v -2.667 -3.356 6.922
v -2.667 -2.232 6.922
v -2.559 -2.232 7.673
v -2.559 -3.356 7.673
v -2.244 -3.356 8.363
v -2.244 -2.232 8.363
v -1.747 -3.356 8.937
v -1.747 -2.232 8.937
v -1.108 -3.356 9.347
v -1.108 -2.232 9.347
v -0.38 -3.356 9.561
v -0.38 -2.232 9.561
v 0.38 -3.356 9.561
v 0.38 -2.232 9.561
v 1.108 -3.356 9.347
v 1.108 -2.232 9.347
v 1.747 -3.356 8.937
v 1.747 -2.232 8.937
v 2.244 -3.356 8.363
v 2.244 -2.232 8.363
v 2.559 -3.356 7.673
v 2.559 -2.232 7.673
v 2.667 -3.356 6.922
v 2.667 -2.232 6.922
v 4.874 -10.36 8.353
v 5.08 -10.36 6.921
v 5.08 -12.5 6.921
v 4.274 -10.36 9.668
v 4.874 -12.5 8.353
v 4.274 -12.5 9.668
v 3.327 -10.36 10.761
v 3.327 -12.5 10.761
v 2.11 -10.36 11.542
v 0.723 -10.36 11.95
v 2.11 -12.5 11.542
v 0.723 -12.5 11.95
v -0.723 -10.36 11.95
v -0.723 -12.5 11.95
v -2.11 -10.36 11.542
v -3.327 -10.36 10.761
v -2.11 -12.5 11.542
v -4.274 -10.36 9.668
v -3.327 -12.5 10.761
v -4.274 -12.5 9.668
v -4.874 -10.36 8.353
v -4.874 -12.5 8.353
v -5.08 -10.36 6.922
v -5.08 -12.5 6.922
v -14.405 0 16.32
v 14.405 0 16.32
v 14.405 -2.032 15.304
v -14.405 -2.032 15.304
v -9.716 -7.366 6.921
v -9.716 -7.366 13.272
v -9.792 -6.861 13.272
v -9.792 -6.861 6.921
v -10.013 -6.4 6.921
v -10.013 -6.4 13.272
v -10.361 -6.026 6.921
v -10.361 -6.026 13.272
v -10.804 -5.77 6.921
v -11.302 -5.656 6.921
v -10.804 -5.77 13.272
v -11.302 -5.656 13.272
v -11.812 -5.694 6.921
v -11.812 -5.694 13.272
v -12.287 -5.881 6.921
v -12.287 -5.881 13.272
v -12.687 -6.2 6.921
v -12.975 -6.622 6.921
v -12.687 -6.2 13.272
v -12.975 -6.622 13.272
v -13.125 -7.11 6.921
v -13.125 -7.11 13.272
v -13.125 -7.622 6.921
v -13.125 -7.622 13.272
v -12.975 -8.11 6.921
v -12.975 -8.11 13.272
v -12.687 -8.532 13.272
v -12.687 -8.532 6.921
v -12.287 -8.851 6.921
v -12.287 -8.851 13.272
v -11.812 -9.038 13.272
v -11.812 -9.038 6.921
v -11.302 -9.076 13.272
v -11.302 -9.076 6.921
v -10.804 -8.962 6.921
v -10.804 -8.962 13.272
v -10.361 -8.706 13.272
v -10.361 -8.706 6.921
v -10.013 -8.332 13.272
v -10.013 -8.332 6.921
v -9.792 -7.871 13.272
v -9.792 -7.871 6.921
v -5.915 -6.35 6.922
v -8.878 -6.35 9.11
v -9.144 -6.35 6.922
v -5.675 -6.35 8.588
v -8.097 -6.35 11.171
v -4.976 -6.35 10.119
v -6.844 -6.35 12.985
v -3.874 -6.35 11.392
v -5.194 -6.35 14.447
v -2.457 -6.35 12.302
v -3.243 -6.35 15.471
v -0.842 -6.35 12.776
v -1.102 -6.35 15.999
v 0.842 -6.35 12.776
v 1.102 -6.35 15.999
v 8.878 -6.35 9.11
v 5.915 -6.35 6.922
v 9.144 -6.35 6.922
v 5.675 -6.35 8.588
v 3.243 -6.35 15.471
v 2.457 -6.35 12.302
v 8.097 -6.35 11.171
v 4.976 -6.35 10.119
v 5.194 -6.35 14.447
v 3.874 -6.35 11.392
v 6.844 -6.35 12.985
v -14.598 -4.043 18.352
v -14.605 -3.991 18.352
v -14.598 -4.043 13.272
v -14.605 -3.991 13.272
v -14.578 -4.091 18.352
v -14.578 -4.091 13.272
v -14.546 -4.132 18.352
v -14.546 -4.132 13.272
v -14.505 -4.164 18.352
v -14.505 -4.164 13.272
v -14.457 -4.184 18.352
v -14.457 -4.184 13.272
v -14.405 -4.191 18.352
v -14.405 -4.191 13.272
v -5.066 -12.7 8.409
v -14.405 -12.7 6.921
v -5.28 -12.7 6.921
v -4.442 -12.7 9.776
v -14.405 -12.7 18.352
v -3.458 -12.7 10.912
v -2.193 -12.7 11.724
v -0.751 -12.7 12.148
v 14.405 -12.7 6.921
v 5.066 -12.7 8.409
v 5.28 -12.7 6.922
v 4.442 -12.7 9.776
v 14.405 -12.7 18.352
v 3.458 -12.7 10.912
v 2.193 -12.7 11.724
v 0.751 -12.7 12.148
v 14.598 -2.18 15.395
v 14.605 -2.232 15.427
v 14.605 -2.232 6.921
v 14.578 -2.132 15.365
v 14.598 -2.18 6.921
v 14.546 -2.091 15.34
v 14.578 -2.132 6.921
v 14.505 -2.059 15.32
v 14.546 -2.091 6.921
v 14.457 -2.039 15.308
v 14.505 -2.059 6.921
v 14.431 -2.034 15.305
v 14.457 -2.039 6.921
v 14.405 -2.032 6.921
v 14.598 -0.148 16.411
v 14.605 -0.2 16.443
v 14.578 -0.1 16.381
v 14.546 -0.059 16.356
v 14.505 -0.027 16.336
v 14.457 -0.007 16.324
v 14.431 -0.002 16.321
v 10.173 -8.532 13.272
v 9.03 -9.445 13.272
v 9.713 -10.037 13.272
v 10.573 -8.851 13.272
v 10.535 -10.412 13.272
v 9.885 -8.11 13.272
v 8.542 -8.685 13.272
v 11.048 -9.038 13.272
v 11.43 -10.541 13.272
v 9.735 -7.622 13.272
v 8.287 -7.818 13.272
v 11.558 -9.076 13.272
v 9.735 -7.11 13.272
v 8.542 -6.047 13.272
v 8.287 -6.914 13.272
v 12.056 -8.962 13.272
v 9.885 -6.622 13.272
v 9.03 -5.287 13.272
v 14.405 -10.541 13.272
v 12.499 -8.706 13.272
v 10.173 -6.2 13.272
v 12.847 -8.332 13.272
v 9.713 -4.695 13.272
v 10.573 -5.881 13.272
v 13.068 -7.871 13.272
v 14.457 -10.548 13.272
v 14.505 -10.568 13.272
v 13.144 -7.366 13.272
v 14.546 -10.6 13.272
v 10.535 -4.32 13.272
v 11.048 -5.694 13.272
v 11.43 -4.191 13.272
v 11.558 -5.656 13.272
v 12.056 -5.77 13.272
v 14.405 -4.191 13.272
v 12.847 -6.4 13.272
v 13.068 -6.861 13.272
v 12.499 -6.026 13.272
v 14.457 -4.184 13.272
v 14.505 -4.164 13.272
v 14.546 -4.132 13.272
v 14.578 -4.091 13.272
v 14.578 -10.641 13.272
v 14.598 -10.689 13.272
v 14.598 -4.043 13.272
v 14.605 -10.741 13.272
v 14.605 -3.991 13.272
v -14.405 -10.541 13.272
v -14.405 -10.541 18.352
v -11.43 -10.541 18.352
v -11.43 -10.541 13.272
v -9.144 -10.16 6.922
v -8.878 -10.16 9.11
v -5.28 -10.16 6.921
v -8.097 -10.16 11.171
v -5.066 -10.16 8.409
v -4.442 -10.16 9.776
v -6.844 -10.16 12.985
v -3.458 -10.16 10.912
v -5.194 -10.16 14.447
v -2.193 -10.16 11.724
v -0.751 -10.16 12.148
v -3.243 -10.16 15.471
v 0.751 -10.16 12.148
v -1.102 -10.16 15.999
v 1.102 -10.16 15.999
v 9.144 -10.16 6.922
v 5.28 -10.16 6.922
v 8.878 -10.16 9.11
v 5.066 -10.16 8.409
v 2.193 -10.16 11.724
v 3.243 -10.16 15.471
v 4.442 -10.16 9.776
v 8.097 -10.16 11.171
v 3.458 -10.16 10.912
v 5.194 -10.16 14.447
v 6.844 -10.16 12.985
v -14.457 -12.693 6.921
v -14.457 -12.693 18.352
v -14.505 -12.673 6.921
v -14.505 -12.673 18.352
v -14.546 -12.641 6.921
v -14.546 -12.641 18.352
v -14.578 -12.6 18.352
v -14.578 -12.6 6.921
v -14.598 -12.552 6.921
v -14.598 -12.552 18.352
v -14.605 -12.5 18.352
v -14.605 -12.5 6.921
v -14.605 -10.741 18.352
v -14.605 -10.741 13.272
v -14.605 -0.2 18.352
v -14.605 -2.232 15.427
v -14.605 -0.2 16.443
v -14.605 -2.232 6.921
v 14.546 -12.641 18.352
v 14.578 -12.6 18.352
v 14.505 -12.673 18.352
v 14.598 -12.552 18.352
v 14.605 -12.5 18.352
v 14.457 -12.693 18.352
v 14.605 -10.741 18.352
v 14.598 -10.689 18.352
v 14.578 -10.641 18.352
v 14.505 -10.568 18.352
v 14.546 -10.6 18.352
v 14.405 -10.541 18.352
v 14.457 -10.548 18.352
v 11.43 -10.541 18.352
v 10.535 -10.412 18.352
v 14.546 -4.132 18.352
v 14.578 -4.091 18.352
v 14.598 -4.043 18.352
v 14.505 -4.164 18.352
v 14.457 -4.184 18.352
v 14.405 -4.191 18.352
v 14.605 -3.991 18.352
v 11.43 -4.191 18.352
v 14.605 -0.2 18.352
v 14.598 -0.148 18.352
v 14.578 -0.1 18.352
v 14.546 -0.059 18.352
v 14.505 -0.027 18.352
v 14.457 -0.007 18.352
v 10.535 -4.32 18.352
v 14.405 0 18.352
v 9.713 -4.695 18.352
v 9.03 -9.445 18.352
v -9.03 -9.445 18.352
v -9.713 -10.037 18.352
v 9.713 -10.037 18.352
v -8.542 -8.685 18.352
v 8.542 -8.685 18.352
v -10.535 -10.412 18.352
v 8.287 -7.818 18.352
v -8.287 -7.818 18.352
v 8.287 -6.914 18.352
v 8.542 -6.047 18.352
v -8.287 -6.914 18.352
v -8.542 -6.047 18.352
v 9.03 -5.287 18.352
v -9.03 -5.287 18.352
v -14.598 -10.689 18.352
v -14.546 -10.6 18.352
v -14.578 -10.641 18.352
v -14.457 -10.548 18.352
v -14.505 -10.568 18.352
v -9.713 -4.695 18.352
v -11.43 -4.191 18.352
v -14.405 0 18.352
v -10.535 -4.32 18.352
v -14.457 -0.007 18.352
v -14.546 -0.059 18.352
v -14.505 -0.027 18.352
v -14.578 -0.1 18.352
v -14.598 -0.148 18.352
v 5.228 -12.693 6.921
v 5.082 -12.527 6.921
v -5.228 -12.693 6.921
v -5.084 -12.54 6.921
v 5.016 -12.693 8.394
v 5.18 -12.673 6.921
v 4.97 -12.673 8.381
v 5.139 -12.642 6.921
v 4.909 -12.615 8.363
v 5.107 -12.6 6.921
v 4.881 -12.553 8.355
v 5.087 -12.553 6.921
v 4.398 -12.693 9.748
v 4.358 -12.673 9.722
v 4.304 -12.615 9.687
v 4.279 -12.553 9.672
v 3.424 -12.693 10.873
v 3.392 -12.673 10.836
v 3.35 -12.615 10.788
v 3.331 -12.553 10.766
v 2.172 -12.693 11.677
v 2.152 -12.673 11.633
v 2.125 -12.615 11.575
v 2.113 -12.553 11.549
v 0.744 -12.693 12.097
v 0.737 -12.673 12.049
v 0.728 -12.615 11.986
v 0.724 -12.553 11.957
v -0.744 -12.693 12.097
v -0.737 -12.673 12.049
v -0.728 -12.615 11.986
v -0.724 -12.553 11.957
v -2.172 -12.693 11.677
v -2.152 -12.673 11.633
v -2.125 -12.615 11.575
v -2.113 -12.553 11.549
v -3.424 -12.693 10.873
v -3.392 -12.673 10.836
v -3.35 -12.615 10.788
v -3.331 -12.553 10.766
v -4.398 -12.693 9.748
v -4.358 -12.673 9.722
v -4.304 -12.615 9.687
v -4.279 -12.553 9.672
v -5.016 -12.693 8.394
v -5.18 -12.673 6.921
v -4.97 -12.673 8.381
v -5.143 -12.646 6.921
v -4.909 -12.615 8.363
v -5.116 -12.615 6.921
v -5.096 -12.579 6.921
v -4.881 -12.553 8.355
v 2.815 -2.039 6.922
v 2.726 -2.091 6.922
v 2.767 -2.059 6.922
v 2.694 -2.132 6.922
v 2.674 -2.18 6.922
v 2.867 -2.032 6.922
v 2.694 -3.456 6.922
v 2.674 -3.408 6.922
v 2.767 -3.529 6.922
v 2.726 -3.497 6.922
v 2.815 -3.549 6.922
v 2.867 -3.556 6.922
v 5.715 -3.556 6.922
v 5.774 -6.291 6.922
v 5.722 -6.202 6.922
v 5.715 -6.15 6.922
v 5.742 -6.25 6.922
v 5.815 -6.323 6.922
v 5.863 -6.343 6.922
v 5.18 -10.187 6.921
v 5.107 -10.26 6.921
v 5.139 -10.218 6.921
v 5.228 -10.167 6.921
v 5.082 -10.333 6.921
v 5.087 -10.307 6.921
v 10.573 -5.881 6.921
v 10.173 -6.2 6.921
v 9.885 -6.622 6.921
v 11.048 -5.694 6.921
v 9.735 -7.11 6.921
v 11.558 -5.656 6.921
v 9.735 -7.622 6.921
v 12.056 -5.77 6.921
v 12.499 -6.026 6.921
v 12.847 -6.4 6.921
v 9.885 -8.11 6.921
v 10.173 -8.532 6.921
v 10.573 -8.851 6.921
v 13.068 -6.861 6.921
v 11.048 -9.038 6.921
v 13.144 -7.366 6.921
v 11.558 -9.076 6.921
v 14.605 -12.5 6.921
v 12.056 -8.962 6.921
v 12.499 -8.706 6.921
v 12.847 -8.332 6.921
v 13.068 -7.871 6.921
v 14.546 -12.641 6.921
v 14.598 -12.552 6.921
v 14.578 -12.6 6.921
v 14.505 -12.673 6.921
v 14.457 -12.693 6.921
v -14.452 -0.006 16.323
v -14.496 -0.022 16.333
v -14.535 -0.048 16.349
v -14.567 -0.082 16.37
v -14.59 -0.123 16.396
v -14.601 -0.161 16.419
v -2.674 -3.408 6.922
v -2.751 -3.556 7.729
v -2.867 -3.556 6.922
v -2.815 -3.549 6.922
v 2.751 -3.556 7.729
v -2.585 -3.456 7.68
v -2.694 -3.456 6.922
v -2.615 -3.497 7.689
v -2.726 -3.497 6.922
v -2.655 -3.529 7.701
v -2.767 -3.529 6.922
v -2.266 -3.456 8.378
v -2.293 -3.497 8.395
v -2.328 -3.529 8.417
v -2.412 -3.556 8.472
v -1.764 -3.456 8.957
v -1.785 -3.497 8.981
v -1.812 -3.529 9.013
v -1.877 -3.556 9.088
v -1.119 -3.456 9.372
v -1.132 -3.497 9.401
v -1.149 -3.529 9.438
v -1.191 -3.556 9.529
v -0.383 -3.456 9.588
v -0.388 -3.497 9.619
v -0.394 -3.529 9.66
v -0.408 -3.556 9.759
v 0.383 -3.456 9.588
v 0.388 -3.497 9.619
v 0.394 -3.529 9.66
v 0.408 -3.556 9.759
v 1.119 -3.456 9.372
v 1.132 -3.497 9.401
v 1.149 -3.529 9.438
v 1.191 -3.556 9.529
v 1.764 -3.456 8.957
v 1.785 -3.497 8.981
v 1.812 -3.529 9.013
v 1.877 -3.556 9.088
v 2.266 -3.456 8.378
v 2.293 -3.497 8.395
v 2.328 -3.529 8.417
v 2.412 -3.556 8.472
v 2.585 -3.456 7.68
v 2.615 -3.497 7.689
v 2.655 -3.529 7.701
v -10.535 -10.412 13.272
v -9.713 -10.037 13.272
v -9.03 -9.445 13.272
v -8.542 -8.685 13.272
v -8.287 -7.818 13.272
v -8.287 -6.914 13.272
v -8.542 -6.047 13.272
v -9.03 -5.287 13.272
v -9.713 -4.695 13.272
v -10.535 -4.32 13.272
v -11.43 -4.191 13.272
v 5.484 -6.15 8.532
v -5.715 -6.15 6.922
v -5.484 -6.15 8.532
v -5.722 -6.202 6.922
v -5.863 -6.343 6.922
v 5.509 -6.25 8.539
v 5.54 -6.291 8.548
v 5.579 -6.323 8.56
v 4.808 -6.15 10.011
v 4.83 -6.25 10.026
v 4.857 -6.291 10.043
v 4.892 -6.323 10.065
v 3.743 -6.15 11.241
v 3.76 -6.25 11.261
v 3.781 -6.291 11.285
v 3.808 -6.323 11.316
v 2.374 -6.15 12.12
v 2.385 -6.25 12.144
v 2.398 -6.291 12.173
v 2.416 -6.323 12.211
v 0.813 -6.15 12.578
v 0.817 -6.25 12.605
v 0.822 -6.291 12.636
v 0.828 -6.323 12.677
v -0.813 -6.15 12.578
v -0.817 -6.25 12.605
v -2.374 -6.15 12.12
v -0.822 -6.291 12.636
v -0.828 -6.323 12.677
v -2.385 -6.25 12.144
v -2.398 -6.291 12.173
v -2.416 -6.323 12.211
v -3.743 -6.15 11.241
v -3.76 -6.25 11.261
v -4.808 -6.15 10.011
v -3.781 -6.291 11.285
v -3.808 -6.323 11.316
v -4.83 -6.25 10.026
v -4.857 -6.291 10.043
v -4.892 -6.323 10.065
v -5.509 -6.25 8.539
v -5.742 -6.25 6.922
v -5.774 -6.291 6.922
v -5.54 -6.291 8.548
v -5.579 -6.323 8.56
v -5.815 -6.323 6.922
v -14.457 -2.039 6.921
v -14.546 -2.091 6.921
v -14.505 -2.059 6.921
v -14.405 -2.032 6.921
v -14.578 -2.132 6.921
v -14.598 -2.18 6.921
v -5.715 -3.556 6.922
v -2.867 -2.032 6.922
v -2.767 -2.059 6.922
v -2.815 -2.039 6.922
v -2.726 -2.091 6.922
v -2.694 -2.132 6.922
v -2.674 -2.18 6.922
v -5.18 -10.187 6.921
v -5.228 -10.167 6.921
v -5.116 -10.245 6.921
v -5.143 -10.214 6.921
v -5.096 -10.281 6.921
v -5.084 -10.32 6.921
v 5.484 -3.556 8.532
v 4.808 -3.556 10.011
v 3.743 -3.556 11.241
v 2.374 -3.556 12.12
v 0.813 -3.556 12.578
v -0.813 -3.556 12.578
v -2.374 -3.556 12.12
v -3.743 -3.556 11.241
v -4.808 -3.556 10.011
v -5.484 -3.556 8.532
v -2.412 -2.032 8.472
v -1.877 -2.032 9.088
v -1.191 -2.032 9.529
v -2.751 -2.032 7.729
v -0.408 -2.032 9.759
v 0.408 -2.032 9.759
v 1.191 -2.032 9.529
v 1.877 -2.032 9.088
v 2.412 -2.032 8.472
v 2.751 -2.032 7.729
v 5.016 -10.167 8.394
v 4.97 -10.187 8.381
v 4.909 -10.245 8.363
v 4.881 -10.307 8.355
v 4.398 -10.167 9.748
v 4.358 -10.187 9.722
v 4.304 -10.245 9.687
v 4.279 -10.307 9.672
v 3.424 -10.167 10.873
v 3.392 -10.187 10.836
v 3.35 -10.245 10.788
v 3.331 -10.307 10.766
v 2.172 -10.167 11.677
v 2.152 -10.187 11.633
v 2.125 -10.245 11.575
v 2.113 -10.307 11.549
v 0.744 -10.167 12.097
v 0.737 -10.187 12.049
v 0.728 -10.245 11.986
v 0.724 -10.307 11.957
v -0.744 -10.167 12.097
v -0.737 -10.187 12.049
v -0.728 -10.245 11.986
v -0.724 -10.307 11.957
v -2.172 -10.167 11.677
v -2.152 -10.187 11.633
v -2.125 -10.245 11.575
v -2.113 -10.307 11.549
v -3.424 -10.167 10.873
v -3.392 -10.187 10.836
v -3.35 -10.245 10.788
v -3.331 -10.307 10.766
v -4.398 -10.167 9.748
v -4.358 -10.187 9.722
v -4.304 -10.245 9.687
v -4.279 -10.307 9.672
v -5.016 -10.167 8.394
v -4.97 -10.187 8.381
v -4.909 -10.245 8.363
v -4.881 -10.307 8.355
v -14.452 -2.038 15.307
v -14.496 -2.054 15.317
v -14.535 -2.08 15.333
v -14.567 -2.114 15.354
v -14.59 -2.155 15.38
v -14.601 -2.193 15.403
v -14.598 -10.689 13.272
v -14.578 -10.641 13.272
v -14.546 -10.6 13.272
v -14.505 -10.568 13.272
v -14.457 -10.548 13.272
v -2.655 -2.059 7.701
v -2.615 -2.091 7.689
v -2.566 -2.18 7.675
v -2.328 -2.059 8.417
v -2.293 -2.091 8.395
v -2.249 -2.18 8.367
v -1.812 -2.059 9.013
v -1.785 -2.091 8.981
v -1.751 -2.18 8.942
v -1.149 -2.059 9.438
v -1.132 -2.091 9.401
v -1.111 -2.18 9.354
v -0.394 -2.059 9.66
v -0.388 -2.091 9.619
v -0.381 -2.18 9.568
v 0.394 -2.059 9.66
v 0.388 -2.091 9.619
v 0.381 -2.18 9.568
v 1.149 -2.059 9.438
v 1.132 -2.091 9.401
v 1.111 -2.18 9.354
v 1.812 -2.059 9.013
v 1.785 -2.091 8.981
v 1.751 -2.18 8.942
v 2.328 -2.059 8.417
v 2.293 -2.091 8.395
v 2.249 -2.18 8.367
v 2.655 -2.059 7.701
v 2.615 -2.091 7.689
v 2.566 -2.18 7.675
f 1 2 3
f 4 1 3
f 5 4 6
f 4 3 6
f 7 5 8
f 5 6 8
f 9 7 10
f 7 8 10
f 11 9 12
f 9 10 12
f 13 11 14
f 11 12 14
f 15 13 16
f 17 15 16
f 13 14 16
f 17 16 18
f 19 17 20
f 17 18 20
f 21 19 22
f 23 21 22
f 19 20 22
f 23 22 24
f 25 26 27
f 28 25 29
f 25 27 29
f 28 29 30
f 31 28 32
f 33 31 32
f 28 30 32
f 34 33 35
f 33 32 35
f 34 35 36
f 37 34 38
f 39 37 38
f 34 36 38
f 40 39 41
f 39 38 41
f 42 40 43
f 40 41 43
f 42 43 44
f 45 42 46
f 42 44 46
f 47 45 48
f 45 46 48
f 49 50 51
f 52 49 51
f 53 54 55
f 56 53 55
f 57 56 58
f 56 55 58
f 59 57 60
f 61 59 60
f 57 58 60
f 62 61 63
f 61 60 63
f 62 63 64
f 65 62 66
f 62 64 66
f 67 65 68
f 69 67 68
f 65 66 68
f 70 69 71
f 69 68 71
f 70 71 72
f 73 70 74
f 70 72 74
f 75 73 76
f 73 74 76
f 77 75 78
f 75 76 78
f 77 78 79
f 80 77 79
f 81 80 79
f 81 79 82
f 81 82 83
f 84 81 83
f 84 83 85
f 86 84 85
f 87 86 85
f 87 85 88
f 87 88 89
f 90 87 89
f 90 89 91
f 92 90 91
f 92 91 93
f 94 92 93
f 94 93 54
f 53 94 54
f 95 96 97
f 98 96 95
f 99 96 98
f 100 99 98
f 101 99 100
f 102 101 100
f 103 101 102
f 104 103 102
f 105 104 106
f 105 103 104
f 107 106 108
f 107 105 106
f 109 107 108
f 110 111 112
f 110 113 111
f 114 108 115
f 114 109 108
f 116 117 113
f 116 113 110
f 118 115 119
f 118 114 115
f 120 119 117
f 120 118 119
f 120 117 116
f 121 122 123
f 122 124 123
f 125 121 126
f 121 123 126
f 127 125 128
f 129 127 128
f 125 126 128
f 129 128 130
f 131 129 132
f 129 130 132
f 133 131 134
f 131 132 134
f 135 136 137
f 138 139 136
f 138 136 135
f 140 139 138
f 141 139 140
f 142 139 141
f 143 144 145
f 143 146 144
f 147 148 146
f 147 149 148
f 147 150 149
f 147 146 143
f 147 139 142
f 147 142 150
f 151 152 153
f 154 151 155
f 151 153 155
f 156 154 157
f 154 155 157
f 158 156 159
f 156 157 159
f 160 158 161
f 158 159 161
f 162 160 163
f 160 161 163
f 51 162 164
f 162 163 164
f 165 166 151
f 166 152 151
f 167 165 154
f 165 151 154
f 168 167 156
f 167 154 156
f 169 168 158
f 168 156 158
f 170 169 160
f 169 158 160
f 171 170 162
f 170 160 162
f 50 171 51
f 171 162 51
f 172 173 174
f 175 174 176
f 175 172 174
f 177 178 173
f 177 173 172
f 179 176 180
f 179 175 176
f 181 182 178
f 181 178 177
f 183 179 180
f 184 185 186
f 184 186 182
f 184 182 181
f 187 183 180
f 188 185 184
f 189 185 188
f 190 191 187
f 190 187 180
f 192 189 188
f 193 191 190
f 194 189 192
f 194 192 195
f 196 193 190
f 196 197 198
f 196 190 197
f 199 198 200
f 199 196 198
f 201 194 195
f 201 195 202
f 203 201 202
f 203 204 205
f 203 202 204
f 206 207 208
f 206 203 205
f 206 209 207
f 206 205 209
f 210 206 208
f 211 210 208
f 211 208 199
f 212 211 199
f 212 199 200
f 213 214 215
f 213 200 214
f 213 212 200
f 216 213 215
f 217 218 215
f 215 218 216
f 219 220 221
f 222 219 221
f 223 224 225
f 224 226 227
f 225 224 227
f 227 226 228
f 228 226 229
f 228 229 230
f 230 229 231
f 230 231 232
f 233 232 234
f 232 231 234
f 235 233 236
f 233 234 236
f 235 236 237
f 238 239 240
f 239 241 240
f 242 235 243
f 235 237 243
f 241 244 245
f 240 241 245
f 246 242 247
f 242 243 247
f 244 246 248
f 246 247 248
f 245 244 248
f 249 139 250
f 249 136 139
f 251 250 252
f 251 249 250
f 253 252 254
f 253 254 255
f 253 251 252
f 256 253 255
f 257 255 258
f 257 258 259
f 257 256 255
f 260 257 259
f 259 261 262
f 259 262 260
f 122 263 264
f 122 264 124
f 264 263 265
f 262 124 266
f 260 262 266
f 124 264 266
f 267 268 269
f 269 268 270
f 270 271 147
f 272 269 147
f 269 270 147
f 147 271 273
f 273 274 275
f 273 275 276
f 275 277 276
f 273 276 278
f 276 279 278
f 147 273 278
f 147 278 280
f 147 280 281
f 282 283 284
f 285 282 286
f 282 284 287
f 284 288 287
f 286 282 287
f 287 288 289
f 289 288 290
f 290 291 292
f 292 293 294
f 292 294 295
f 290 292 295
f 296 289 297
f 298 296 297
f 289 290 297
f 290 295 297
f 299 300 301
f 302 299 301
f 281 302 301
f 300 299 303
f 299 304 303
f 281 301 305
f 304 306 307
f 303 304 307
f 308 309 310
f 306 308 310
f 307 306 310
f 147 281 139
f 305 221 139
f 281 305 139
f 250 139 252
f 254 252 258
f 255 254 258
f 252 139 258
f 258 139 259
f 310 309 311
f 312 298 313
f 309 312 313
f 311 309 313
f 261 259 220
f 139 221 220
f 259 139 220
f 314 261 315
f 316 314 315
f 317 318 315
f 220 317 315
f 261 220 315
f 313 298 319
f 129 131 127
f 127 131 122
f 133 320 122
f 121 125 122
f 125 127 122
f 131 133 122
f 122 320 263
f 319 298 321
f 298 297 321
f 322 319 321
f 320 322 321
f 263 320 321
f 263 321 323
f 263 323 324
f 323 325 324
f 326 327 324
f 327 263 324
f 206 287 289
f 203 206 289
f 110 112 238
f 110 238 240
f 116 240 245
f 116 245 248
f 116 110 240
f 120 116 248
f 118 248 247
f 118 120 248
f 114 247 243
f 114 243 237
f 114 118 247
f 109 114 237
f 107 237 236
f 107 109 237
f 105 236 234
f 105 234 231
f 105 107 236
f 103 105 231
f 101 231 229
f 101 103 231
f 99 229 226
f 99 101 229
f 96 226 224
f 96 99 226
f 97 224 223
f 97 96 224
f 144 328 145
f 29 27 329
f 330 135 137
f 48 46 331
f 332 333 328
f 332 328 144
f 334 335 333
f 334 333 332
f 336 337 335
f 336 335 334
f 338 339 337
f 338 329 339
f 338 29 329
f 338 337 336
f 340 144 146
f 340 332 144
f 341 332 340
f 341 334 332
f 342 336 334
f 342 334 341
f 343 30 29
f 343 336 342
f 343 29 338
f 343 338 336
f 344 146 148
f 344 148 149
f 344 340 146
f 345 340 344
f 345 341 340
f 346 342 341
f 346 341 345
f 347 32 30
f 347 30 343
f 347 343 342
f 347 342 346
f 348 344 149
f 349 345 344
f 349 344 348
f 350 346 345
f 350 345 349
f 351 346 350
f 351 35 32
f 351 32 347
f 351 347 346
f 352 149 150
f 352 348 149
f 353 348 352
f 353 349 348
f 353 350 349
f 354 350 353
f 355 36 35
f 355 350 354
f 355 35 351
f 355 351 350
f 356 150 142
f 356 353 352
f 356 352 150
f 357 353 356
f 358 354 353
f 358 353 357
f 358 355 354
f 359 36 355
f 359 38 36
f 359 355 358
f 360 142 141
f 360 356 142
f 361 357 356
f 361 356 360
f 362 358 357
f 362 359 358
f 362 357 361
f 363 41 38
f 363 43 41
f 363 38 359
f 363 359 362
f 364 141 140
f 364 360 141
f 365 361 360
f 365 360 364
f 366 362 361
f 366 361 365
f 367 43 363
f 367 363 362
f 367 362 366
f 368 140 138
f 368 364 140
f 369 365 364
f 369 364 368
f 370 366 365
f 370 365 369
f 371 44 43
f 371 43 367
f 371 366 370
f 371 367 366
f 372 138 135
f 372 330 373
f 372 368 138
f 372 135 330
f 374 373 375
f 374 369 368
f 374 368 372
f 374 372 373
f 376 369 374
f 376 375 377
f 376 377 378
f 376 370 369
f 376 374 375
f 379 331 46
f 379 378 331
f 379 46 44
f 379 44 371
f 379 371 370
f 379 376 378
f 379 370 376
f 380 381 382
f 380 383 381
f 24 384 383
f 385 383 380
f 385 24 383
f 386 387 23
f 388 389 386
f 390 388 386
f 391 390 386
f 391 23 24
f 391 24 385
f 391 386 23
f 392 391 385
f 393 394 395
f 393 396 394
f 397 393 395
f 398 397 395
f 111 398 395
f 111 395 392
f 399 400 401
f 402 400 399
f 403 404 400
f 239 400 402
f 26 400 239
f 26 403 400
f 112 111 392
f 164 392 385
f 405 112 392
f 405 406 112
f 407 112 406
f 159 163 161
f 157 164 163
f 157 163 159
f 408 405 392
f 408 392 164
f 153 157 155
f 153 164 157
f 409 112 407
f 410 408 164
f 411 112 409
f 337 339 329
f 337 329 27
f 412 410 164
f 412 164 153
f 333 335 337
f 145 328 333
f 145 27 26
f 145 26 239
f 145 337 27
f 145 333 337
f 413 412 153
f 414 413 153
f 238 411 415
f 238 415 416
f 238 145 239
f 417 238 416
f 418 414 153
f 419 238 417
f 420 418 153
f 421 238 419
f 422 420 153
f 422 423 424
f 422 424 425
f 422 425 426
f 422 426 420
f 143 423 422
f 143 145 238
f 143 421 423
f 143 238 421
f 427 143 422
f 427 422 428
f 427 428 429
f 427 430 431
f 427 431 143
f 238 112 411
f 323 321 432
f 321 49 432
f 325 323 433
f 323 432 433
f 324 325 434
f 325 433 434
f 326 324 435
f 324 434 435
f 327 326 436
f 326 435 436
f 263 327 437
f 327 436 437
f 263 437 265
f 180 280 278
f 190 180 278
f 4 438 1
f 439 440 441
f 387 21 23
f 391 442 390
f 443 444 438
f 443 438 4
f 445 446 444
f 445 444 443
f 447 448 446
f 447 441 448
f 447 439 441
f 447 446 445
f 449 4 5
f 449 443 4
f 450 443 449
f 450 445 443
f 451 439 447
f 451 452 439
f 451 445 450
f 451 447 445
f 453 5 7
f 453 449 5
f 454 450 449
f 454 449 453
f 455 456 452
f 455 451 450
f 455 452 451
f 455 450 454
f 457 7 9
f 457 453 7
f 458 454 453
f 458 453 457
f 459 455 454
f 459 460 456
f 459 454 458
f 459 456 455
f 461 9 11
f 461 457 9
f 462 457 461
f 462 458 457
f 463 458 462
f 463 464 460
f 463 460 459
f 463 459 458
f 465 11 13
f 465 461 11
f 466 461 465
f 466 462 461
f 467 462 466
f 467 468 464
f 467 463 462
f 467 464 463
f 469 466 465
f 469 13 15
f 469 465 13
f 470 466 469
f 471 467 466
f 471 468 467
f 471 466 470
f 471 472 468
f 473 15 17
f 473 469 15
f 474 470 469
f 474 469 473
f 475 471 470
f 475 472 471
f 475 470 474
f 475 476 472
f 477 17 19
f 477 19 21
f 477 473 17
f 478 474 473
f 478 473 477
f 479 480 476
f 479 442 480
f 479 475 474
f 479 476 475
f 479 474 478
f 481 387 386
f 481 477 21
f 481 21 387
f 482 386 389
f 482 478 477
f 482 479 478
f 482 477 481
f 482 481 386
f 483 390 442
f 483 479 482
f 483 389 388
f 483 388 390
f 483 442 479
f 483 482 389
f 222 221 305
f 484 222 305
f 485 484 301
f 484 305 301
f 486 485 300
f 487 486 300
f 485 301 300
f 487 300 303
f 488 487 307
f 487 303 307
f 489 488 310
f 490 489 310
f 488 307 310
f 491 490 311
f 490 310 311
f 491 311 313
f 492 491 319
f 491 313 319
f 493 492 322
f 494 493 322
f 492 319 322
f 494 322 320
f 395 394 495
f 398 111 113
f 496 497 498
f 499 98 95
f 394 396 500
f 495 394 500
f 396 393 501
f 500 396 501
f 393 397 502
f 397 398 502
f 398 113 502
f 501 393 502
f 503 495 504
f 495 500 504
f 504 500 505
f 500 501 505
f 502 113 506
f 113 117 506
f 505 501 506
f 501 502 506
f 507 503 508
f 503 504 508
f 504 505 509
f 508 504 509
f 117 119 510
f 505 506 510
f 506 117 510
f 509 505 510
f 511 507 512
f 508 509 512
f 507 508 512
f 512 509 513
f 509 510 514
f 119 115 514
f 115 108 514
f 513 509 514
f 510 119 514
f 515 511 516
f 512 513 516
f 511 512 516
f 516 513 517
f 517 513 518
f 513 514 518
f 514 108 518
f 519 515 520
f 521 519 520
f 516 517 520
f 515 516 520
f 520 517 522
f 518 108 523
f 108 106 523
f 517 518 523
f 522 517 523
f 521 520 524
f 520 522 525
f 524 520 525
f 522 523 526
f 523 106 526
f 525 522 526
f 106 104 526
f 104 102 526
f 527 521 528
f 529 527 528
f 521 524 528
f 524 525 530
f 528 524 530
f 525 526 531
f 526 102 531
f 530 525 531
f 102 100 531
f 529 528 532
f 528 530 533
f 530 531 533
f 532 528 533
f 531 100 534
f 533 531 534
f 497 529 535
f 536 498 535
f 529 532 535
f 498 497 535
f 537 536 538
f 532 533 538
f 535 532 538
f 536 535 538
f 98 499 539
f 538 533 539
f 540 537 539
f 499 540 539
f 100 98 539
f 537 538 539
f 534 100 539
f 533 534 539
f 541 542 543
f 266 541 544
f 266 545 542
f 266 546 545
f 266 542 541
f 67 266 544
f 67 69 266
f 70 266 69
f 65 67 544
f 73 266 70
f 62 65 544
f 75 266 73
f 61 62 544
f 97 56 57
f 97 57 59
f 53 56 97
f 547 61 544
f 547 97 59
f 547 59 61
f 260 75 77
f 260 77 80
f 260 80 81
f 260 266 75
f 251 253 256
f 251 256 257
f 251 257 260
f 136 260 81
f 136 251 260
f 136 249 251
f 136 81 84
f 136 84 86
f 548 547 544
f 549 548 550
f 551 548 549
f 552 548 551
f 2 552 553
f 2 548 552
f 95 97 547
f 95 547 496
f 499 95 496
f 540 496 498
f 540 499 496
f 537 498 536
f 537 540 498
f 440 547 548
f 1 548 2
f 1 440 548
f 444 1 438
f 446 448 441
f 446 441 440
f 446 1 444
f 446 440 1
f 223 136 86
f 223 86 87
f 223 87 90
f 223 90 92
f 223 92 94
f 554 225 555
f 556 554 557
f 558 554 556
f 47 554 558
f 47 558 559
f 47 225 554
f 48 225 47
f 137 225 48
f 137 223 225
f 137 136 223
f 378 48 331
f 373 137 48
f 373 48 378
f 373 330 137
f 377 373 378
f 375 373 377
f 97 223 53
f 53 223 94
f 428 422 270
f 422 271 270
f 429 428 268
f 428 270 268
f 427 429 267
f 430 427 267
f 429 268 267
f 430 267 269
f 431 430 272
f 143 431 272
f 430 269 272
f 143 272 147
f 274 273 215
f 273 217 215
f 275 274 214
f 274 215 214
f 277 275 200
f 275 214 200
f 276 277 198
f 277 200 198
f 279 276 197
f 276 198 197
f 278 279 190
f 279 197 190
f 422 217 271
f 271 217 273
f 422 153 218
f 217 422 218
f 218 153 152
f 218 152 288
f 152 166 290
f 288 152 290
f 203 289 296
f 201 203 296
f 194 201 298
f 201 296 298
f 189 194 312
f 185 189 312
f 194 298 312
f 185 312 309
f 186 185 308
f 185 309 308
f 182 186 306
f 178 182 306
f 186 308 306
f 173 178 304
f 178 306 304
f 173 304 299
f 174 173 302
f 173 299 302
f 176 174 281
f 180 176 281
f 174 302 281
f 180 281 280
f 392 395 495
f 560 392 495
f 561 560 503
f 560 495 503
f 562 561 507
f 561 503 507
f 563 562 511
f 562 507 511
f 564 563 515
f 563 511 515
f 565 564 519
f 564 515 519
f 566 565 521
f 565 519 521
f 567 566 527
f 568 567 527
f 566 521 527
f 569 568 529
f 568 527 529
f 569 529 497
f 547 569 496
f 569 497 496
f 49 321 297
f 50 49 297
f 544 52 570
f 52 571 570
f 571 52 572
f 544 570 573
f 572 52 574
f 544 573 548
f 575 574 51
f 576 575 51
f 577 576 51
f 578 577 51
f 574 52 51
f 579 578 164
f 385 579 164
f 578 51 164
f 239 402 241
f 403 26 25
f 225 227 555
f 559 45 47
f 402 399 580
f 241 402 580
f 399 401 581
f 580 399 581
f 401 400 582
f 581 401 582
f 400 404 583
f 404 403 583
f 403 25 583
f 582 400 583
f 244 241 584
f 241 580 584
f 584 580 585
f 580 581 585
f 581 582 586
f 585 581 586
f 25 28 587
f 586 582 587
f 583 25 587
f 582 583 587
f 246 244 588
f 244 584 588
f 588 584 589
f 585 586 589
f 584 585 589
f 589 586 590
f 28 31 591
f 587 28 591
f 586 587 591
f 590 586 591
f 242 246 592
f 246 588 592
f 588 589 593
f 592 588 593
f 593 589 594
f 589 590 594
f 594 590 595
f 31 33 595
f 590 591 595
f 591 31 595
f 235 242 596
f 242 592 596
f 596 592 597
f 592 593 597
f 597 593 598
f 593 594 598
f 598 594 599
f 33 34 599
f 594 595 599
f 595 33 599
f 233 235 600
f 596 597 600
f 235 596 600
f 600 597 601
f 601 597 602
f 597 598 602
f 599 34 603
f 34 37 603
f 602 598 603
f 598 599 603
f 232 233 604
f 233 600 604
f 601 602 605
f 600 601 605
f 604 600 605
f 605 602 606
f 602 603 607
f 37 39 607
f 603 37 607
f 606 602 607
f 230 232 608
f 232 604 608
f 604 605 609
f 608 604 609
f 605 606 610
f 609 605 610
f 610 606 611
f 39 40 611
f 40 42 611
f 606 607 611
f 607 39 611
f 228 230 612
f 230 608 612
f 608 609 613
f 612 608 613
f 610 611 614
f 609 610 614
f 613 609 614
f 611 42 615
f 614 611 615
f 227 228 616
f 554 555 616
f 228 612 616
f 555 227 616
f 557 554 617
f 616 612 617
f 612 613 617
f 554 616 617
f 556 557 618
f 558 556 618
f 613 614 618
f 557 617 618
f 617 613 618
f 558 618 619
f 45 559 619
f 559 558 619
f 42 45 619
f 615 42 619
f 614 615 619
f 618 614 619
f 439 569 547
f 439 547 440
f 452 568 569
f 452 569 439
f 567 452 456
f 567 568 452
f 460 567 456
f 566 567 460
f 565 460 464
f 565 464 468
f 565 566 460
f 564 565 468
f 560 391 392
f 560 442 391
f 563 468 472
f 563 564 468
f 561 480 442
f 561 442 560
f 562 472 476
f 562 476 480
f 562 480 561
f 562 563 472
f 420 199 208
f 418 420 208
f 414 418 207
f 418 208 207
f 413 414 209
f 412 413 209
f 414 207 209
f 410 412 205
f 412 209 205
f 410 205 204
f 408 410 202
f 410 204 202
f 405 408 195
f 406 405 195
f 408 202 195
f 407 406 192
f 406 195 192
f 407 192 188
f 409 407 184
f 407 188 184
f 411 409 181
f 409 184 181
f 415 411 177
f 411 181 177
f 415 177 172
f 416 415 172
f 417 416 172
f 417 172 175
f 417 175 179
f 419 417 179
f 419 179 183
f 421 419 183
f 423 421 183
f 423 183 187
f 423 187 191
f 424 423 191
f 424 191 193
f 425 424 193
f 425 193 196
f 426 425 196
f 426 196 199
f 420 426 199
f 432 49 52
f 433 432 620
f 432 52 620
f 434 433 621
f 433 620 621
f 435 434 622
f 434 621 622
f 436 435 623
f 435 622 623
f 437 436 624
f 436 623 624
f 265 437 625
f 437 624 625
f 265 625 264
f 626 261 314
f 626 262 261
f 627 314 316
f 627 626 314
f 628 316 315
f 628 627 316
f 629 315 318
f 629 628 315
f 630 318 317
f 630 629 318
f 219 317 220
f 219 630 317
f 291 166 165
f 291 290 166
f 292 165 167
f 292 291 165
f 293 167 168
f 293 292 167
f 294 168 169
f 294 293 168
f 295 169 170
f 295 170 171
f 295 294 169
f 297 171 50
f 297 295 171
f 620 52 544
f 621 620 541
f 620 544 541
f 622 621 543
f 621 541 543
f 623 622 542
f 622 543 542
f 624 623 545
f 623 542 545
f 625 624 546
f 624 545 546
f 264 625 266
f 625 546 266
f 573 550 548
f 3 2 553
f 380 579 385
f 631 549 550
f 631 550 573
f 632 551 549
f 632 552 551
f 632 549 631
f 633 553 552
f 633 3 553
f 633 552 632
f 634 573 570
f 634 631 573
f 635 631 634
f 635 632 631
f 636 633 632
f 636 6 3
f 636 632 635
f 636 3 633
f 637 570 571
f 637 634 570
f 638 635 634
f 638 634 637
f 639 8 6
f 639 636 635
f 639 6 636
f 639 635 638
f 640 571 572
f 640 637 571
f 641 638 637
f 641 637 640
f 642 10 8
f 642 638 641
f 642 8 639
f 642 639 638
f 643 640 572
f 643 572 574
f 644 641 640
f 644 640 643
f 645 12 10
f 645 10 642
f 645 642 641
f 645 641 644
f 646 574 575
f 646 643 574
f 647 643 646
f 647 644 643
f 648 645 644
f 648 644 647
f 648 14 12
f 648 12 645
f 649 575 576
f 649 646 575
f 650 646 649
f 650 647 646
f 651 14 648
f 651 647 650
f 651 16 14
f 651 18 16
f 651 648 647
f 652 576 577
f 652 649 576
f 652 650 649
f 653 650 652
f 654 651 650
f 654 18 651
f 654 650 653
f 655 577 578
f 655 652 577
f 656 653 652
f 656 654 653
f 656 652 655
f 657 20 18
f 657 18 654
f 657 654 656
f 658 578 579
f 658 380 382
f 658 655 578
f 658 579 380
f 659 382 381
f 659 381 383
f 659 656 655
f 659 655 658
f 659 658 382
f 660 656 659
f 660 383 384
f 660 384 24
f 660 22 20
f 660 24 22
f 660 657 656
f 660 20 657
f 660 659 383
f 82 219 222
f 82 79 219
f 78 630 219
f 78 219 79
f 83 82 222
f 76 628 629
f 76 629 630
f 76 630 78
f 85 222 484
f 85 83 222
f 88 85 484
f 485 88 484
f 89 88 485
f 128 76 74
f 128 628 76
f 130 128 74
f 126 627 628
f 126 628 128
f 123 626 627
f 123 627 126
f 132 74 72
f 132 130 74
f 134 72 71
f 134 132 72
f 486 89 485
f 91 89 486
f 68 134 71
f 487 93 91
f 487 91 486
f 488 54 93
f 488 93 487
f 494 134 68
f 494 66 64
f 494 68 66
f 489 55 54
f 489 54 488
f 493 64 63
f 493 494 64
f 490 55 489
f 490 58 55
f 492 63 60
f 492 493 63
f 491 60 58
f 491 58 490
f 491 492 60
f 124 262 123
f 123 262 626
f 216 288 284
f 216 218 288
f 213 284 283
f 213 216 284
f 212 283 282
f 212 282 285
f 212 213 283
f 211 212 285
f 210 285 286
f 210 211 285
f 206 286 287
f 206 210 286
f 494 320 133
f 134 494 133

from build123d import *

# Parameters (mm, degrees)
F1_DEPTH  = 12.7
F4_DEPTH  = 3.81
F6_DEPTH  = 8.636
F8_DEPTH  = 29.211
F9_R      = 2.667
F10_DEPTH = 4.318
F12_DEPTH = 5.08
F13_R     = 1.7145
F14_DEPTH = 12.7
F15_R     = 5.715
F16_DEPTH = 2.794
F17_W     = 29.21
F17_H     = 12.7
F18_DEPTH = 10.668
F19_R     = 0.2


with BuildPart() as f1:
    # F0 (on Front) → F1 (new body)
    with BuildSketch(Plane.XZ):
        Polygon((-14.605, -3.7465), (14.605, -3.7465), (14.605, 3.7465), (14.605, 18.3515), (-14.605, 18.3515), (-14.605, 3.7465), align=None)
    extrude(amount=F1_DEPTH)

    # F3 (on offset) → F4 (cut)
    with BuildSketch(Plane.XZ.offset(6.35)):
        with BuildLine():
            Line((-9.144, -3.7465), (9.144, -3.7465))
            Line((9.144, -3.7465), (9.144, 6.9215))
            ThreePointArc((9.144, 6.9215), (0, 16.0655), (-9.144, 6.9215))
            Line((-9.144, 6.9215), (-9.144, -3.7465))
        make_face()
    extrude(amount=F4_DEPTH, mode=Mode.SUBTRACT)

    # F5 (on face) → F6 (cut)
    with BuildSketch(Plane.XZ.offset(12.7)):
        with BuildLine():
            Line((6.35, -3.7465), (4.8460111432, 5.3975))
            ThreePointArc((4.8460111432, 5.3975), (0, 12.0015), (-4.8460111432, 5.3975))
            Line((-4.8460111432, 5.3975), (-6.35, -3.7465))
            Line((-6.35, -3.7465), (6.35, -3.7465))
        make_face()
    extrude(amount=-F6_DEPTH, mode=Mode.SUBTRACT)

    # F7 (on face) → F8 (cut, through all)
    with BuildSketch(Plane.YZ.offset(14.605)):
        Polygon((-2.032, -0.6985), (0, -1.7145), (0, 16.3195), (-2.032, 15.3035), align=None)
    extrude(amount=-F8_DEPTH, mode=Mode.SUBTRACT)

    # F9 (on face) → F10 (cut, through all)
    with BuildSketch(Plane(origin=(0, -2.032, 0), x_dir=(-1, 0, 0), z_dir=(0, 1, 0))):
        with Locations((0, 6.9215)):
            Circle(F9_R)
    extrude(amount=-F10_DEPTH, mode=Mode.SUBTRACT)

    # F11 (on face) → F12 (cut)
    with BuildSketch(Plane.XY.offset(18.3515)):
        with BuildLine():
            Line((14.605, -4.191), (11.43, -4.191))
            ThreePointArc((11.43, -4.191), (8.255, -7.366), (11.43, -10.541))
            Line((11.43, -10.541), (14.605, -10.541))
            Line((14.605, -10.541), (14.605, -4.191))
        make_face()
        with BuildLine():
            ThreePointArc((-11.43, -10.541), (-8.255, -7.366), (-11.43, -4.191))
            Line((-11.43, -4.191), (-14.605, -4.191))
            Line((-14.605, -4.191), (-14.605, -10.541))
            Line((-14.605, -10.541), (-11.43, -10.541))
        make_face()
    extrude(amount=-F12_DEPTH, mode=Mode.SUBTRACT)

    # F13 (on face) → F14 (cut)
    with BuildSketch(Plane.XY.offset(13.2715)):
        with Locations((11.43, -7.366)):
            Circle(F13_R)
        with Locations((-11.43, -7.366)):
            Circle(F13_R)
    extrude(amount=-F14_DEPTH, mode=Mode.SUBTRACT)

    # F15 (on face) → F16 (cut)
    with BuildSketch(Plane.XZ.offset(6.35)):
        with Locations((0, 6.9215)):
            Circle(F15_R)
    extrude(amount=-F16_DEPTH, mode=Mode.SUBTRACT)

    # F17 (on face) → F18 (cut)
    with BuildSketch(Plane(origin=(0, 0, -3.7465), x_dir=(1, 0, 0), z_dir=(0, 0, -1))):
        with Locations((0, 6.35)):
            Rectangle(F17_W, F17_H)
    extrude(amount=-F18_DEPTH, mode=Mode.SUBTRACT)

    # F19
    f19_edges = [f1.edges().sort_by_distance(p)[0] for p in [
        (14.605, -12.7, 12.6365),
        (14.605, -2.032, 11.1125),
        (14.605, -1.016, 15.8115),
        (14.605, 0, 17.3355),
        (14.605, -10.541, 15.8115),
        (14.605, -4.191, 15.8115),
        (-14.605, -12.7, 12.6365),
        (-14.605, -10.541, 15.8115),
        (-14.605, -4.191, 15.8115),
        (-14.605, 0, 17.3355),
        (-14.605, -2.032, 11.1125),
        (-14.605, -1.016, 15.8115),
        (0, -12.7, 12.0015),
        (0, -10.16, 12.0015),
        (0, -6.35, 12.6365),
        (0, -3.556, 9.5885),
        (0, -2.032, 9.5885),
    ]]
    fillet(f19_edges, radius=F19_R)


solid = f1.part
